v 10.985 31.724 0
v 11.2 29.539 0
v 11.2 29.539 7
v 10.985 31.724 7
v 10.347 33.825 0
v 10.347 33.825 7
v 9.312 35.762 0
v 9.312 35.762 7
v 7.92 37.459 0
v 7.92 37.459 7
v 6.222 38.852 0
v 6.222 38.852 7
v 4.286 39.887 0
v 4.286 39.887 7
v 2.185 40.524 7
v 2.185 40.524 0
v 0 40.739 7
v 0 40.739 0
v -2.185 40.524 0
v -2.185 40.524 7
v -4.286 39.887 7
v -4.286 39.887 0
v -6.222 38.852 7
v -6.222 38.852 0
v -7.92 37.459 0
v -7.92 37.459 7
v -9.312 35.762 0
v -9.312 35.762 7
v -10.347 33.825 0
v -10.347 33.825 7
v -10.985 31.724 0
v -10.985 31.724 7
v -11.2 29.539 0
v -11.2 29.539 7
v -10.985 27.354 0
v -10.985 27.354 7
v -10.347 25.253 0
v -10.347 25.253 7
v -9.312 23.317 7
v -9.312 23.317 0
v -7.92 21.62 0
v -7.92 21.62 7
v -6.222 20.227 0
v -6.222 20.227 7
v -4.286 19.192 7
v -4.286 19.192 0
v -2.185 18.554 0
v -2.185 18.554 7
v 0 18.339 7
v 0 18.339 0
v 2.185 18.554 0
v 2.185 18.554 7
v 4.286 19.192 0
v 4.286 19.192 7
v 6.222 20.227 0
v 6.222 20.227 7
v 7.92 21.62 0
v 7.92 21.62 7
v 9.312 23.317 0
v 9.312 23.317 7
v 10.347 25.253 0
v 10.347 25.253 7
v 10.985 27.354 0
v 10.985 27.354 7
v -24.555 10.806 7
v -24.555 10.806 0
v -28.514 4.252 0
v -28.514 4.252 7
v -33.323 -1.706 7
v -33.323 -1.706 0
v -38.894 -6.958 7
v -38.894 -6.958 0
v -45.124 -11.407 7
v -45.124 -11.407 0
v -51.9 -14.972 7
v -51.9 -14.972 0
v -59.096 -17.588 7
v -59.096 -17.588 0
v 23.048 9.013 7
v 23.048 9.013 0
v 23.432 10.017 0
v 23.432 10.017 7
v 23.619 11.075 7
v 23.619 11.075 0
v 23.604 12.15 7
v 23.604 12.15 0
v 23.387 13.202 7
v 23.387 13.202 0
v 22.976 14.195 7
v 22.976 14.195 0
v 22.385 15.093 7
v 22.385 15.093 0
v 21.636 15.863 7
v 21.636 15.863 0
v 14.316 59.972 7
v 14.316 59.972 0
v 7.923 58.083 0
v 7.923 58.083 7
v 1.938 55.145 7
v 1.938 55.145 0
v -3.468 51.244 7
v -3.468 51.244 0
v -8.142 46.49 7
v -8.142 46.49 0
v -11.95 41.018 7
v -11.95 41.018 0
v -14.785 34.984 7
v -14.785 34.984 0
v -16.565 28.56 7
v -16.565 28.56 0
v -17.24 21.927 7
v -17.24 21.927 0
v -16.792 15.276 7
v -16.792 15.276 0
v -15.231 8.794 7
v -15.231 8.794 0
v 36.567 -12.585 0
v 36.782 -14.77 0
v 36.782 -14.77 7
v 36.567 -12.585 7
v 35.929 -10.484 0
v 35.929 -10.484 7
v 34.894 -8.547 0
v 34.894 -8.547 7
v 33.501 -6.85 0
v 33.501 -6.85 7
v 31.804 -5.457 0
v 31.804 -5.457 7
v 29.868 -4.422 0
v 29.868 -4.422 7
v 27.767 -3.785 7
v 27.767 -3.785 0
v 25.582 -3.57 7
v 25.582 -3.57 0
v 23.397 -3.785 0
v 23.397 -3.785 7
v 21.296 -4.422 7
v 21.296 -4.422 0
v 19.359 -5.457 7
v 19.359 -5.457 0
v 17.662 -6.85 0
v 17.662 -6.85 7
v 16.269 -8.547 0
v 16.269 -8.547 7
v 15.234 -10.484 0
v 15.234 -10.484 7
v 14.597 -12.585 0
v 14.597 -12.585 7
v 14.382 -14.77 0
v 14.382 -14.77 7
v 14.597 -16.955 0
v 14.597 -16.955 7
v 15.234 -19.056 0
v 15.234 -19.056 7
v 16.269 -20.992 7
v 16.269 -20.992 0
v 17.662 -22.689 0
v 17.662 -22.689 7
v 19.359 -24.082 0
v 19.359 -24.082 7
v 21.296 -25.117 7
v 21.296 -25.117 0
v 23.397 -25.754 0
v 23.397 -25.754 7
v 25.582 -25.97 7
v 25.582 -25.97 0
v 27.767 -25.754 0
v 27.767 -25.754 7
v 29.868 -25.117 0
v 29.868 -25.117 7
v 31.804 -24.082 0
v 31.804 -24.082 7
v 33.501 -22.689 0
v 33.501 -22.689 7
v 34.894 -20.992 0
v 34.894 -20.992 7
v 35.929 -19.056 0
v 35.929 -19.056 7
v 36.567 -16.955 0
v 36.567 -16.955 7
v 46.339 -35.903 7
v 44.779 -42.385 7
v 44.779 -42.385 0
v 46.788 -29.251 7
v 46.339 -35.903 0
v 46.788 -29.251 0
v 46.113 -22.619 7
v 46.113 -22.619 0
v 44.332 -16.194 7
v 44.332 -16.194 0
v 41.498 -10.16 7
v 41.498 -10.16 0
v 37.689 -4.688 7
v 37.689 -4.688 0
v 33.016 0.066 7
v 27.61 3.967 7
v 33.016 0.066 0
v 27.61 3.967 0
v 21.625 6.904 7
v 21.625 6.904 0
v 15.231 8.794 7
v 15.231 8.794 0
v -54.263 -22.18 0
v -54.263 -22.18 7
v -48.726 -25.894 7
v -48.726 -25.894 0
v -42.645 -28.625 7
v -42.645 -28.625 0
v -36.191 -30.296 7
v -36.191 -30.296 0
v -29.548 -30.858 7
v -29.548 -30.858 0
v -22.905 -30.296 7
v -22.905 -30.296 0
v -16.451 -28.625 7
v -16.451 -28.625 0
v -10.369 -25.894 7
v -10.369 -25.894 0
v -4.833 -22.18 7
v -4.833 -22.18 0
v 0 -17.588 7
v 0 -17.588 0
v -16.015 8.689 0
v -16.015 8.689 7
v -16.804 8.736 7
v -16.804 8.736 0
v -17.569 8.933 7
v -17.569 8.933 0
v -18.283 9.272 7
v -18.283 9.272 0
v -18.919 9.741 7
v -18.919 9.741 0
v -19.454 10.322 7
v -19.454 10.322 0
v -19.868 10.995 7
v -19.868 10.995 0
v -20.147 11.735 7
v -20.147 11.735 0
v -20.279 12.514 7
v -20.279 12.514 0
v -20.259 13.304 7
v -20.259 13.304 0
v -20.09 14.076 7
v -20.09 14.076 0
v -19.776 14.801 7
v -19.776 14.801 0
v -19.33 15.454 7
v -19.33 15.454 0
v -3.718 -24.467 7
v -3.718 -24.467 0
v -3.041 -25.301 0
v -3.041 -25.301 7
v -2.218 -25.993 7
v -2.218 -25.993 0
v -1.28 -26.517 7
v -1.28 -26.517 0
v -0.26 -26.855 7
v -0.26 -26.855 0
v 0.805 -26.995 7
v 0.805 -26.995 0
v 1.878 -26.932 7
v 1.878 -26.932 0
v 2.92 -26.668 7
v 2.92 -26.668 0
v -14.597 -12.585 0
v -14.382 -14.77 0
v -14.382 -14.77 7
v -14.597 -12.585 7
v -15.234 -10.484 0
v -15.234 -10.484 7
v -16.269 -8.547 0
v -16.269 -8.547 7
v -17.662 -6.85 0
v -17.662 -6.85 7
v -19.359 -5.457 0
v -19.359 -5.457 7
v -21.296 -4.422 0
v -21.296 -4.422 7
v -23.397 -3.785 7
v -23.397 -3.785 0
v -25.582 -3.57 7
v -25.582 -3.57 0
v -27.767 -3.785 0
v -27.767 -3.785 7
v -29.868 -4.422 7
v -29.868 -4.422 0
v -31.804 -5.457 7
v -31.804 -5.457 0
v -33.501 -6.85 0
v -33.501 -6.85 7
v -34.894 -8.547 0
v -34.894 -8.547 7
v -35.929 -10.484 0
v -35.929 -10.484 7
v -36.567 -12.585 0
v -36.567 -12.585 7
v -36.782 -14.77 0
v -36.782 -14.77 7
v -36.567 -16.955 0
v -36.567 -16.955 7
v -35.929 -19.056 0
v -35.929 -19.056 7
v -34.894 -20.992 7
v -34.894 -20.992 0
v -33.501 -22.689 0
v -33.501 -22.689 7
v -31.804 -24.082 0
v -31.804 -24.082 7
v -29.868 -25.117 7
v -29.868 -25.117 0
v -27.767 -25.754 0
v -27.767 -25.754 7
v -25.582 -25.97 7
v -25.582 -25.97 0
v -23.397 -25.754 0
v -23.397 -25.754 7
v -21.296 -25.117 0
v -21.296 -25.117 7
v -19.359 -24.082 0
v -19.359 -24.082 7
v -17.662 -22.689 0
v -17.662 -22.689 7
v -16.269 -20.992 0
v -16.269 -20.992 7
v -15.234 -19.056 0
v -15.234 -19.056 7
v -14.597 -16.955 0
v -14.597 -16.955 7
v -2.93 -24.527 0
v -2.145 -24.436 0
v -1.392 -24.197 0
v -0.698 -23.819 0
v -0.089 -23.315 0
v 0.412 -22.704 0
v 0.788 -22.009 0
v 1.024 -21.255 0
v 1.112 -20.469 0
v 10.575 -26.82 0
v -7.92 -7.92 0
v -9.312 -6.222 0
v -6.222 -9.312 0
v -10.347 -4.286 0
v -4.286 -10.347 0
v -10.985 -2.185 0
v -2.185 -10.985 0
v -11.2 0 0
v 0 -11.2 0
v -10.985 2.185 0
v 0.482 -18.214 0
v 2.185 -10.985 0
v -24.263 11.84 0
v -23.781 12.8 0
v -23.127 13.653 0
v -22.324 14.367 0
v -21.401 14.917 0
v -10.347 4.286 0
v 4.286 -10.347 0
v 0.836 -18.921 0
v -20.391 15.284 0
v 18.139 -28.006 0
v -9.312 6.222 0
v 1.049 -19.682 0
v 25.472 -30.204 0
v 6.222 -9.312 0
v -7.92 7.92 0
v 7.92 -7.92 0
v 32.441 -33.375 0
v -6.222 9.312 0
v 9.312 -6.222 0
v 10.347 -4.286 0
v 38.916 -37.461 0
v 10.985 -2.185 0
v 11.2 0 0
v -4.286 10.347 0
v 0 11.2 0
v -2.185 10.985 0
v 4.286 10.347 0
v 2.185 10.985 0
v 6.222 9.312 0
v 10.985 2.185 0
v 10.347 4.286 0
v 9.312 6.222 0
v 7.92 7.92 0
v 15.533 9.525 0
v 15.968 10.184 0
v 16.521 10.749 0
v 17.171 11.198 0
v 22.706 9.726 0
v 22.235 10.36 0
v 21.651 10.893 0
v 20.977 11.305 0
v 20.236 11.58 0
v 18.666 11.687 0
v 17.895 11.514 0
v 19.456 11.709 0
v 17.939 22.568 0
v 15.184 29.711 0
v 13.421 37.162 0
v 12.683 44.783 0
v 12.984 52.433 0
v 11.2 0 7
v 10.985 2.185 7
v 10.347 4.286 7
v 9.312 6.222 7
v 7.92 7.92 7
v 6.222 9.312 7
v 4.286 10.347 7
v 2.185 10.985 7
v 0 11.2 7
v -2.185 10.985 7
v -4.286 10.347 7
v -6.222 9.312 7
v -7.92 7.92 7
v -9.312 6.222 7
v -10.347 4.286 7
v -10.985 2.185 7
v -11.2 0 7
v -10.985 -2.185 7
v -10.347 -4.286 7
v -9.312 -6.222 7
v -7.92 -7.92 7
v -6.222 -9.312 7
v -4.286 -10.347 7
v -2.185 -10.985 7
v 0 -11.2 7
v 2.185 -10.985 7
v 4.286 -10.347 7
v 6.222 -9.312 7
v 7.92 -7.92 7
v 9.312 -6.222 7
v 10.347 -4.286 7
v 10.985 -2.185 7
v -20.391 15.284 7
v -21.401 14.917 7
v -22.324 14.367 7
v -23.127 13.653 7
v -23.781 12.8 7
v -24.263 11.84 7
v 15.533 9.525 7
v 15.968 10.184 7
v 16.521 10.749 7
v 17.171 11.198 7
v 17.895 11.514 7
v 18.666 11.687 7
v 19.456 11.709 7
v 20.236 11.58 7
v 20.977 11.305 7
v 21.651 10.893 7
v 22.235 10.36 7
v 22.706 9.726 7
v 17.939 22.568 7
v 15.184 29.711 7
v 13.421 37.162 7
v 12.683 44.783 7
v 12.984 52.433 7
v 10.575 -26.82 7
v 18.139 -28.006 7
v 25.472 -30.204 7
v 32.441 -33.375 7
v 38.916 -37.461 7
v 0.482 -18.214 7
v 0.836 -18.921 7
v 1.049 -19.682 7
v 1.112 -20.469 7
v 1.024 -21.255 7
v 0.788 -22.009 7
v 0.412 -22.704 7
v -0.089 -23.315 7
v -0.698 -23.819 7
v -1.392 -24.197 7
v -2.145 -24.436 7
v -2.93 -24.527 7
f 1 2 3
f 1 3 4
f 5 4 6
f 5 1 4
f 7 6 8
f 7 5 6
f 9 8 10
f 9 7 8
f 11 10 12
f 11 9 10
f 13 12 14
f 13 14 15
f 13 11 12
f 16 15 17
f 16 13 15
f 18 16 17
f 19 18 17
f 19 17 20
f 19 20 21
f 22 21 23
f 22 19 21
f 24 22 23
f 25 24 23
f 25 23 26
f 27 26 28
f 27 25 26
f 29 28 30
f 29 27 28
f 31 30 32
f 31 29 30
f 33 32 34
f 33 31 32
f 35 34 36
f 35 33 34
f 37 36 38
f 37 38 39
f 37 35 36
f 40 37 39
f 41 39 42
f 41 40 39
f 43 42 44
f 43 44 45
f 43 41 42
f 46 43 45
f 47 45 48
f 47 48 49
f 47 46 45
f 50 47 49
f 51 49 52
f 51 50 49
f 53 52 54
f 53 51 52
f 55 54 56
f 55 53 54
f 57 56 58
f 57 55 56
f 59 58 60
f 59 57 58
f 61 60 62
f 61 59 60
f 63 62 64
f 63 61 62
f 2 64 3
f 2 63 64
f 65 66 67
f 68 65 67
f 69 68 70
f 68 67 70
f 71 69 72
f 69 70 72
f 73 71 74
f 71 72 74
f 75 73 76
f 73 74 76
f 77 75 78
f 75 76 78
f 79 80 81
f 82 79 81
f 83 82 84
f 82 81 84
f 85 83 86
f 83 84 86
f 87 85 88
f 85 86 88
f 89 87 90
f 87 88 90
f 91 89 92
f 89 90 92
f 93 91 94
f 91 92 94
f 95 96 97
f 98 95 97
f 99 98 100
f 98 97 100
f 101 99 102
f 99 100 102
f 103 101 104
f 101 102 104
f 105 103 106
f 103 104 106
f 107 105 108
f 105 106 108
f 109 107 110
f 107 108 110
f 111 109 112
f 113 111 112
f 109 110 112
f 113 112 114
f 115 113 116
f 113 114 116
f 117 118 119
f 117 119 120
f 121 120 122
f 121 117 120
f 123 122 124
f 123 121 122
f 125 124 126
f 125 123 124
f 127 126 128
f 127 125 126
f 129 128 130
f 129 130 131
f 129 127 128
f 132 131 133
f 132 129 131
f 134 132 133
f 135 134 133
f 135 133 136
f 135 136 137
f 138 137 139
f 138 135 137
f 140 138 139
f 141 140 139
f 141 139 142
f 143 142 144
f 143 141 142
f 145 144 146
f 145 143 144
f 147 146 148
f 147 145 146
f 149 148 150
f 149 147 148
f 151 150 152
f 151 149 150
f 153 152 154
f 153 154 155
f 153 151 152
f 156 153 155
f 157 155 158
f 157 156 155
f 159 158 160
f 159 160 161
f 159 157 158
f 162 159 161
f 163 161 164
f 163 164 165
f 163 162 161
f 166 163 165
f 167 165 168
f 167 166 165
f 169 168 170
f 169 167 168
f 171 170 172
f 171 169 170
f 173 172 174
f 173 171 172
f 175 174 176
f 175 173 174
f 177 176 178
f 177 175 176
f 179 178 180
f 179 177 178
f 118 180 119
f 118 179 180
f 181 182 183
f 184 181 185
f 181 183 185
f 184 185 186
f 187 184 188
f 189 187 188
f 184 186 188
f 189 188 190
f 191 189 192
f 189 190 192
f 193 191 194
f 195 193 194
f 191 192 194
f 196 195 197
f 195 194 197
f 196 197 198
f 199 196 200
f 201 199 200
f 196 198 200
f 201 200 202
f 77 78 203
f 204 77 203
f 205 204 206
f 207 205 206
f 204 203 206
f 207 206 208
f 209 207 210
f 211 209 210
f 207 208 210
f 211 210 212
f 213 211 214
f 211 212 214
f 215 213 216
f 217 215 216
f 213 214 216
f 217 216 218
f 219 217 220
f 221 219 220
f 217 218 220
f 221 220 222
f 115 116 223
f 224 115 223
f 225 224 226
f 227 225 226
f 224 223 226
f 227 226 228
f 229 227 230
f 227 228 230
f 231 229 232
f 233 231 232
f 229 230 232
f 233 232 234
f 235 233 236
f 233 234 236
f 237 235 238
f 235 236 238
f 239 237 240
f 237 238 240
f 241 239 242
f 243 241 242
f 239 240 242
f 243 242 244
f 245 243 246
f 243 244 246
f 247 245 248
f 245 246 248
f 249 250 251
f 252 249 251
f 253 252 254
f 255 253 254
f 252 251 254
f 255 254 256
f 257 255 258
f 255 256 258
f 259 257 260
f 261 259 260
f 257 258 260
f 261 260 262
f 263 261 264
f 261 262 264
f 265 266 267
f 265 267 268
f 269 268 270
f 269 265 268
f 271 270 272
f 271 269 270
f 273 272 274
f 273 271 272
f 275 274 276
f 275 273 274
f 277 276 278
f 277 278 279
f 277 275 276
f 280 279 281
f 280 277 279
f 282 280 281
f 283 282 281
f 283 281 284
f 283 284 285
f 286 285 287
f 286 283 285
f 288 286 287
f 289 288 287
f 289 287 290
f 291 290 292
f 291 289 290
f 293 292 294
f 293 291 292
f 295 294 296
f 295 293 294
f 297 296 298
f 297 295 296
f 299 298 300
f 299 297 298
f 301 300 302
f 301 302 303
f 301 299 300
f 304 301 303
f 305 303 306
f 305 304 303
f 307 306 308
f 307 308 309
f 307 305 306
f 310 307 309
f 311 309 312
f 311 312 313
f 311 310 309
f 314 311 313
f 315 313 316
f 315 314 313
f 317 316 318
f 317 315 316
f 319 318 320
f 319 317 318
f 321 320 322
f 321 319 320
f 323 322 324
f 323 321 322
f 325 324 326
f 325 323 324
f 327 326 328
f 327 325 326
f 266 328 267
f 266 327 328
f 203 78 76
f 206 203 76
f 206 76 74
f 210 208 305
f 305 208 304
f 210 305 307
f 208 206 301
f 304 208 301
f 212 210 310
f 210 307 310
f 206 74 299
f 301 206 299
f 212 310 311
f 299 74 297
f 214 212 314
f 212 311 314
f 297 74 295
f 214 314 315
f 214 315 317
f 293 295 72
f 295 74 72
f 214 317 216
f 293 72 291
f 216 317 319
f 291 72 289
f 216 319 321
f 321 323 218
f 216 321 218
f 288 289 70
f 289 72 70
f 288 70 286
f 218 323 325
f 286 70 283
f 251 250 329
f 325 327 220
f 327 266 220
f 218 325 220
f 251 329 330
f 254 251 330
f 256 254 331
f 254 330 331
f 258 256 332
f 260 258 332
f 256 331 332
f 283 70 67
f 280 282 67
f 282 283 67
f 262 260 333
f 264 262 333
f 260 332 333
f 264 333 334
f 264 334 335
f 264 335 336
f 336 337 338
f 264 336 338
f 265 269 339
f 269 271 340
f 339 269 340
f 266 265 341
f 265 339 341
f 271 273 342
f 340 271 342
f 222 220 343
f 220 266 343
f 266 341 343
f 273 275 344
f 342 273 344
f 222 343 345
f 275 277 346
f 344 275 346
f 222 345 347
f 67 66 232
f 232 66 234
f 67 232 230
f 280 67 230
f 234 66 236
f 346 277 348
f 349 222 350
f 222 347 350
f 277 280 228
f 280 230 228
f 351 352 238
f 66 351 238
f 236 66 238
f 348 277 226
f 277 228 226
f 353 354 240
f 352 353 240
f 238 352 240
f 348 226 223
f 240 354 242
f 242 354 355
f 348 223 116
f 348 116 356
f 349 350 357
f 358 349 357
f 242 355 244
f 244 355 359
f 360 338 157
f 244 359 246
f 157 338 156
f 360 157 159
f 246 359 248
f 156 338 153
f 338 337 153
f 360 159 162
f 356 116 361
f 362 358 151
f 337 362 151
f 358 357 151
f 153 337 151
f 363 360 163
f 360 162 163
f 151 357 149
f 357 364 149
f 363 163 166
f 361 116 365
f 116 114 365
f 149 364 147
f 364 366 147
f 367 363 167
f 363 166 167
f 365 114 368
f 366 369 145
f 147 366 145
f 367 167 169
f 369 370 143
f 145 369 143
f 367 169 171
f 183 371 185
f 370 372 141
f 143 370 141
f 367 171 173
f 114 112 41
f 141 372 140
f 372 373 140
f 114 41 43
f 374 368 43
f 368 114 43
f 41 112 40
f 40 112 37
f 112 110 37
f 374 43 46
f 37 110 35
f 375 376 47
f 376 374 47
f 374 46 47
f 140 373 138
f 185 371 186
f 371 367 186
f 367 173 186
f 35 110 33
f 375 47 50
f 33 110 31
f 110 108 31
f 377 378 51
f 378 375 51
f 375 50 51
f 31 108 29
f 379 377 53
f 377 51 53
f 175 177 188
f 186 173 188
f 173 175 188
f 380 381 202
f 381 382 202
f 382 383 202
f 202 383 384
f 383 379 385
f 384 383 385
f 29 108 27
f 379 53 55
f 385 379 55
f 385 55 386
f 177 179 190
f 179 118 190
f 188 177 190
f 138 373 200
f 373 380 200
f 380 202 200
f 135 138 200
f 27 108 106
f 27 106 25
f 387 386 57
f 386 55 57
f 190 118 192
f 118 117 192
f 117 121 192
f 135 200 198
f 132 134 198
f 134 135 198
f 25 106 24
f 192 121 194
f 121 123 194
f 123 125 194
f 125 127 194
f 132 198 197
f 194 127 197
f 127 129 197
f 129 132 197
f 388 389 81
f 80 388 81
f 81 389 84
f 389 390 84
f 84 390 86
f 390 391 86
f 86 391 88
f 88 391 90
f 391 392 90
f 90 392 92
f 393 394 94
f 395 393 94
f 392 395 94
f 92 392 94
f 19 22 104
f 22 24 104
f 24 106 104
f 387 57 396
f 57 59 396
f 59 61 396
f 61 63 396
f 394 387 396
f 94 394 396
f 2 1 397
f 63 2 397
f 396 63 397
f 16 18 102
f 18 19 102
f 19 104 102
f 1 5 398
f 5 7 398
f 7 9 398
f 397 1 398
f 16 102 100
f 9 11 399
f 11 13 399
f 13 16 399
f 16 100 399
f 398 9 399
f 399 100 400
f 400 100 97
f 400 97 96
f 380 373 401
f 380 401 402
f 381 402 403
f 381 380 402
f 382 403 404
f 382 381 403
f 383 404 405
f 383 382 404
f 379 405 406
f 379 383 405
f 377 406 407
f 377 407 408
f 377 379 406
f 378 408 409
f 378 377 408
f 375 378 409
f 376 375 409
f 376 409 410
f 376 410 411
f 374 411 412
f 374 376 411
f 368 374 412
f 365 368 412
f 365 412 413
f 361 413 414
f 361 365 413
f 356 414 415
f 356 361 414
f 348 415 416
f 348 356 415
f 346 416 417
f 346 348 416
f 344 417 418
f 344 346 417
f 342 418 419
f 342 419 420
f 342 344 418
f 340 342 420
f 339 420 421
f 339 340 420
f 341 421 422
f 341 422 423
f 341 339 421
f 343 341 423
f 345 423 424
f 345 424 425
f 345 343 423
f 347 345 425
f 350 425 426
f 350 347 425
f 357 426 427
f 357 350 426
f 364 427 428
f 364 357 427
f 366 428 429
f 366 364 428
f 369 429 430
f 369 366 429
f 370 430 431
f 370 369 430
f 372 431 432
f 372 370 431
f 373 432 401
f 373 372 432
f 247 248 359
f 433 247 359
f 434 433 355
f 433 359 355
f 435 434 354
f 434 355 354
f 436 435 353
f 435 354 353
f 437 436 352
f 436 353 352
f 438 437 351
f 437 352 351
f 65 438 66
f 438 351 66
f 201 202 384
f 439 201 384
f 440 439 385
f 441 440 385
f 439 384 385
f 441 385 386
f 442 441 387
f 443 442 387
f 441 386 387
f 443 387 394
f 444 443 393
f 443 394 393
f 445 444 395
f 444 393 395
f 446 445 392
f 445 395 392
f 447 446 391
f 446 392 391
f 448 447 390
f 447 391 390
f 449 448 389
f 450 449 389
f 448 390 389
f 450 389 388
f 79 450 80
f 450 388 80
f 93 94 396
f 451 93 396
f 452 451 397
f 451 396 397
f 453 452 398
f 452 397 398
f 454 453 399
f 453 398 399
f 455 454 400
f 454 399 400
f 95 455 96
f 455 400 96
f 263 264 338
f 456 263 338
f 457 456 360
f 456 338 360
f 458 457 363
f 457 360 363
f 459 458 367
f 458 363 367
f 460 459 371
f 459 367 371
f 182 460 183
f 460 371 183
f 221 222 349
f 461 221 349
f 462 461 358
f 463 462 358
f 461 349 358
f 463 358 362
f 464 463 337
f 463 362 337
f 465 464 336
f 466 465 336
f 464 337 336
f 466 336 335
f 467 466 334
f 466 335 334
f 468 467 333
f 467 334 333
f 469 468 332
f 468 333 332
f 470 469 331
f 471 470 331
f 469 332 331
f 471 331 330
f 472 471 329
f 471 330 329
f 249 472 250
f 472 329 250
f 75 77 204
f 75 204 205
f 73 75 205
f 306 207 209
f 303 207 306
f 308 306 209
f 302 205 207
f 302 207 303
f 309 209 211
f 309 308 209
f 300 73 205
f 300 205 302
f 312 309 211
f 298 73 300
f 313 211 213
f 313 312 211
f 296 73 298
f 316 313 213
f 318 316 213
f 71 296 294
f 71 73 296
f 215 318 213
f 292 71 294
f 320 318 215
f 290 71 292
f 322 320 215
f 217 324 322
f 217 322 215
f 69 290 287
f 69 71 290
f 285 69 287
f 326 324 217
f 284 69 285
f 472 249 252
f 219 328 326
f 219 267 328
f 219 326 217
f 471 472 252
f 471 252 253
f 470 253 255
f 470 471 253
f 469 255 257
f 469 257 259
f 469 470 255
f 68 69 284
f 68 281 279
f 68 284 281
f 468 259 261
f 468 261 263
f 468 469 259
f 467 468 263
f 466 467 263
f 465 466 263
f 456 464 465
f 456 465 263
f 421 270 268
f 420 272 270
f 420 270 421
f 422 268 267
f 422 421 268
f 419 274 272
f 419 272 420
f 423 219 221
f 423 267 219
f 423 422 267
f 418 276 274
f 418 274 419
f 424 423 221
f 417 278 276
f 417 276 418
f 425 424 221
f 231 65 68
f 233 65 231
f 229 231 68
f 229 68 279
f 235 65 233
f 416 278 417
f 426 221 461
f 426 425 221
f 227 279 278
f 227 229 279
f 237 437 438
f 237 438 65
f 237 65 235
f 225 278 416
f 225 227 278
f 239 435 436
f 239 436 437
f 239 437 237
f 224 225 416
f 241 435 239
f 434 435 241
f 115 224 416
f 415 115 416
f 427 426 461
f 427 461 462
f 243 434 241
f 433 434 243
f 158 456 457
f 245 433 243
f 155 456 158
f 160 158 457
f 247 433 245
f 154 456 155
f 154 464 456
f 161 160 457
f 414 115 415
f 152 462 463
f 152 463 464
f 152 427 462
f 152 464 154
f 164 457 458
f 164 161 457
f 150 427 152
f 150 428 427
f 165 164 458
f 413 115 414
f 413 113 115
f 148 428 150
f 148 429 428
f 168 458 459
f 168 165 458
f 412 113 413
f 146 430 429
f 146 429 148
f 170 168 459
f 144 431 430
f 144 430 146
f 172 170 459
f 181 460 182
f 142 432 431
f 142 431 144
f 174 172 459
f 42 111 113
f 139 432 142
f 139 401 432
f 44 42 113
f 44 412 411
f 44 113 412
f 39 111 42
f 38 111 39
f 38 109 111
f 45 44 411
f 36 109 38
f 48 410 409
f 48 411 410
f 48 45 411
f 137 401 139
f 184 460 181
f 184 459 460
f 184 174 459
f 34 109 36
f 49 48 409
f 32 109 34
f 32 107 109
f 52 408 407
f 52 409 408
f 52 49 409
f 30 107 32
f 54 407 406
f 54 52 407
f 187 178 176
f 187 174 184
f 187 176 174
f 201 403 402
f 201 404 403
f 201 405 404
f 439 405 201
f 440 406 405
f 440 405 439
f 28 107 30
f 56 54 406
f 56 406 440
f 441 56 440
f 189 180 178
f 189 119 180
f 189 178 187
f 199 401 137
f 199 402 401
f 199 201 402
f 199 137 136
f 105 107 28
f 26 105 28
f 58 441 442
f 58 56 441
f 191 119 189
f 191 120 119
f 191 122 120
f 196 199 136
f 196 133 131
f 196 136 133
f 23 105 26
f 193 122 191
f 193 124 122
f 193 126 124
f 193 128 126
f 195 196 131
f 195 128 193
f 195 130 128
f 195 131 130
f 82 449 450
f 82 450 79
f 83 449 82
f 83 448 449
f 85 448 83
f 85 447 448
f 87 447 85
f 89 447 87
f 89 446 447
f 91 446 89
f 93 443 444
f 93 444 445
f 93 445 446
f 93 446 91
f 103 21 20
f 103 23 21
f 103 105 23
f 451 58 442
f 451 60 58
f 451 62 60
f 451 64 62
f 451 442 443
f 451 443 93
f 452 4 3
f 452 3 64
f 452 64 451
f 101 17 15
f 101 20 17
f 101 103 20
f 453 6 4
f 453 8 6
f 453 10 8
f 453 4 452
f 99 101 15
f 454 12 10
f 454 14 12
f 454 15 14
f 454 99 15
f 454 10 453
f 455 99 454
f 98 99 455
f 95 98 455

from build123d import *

# Parameters (mm, degrees)
F0_R     = 11.2
F1_DEPTH = 7


with BuildPart() as f1:
    # F0 (on Top) → F1 (new body)
    with BuildSketch(Plane.XY):
        with BuildLine():
            ThreePointArc((-24.555476, 10.805503), (-38.89385, -6.957617), (-59.095755, -17.587779))
            ThreePointArc((-59.095755, -17.587779), (-29.547878, -30.85808), (0, -17.587779))
            ThreePointArc((0, -17.587779), (0.616641, -22.365553), (-3.718256, -24.466991))
            ThreePointArc((-3.718256, -24.466991), (-0.778036, -26.710105), (2.919898, -26.668418))
            ThreePointArc((2.919898, -26.668418), (25.472398, -30.204253), (44.779341, -42.384536))
            ThreePointArc((44.779341, -42.384536), (41.49782, -10.160173), (15.231463, 8.79389))
            ThreePointArc((15.231463, 8.79389), (19.060817, 11.716804), (23.048163, 9.013391))
            ThreePointArc((23.048163, 9.013391), (23.520647, 12.681254), (21.635578, 15.862915))
            ThreePointArc((21.635578, 15.862915), (13.421452, 37.16187), (14.316414, 59.972315))
            ThreePointArc((14.316414, 59.972315), (-11.949942, 41.018252), (-15.231463, 8.79389))
            ThreePointArc((-15.231463, 8.79389), (-19.677458, 10.64875), (-19.329907, 15.453599))
            ThreePointArc((-19.329907, 15.453599), (-22.742611, 14.028851), (-24.555476, 10.805503))
        make_face()
        with Locations((-25.58171, -14.769607)):
            Circle(F0_R, mode=Mode.SUBTRACT)
        Circle(F0_R, mode=Mode.SUBTRACT)
        with Locations((25.58171, -14.769607)):
            Circle(F0_R, mode=Mode.SUBTRACT)
        with Locations((0, 29.539214)):
            Circle(F0_R, mode=Mode.SUBTRACT)
    extrude(amount=F1_DEPTH)


solid = f1.part
